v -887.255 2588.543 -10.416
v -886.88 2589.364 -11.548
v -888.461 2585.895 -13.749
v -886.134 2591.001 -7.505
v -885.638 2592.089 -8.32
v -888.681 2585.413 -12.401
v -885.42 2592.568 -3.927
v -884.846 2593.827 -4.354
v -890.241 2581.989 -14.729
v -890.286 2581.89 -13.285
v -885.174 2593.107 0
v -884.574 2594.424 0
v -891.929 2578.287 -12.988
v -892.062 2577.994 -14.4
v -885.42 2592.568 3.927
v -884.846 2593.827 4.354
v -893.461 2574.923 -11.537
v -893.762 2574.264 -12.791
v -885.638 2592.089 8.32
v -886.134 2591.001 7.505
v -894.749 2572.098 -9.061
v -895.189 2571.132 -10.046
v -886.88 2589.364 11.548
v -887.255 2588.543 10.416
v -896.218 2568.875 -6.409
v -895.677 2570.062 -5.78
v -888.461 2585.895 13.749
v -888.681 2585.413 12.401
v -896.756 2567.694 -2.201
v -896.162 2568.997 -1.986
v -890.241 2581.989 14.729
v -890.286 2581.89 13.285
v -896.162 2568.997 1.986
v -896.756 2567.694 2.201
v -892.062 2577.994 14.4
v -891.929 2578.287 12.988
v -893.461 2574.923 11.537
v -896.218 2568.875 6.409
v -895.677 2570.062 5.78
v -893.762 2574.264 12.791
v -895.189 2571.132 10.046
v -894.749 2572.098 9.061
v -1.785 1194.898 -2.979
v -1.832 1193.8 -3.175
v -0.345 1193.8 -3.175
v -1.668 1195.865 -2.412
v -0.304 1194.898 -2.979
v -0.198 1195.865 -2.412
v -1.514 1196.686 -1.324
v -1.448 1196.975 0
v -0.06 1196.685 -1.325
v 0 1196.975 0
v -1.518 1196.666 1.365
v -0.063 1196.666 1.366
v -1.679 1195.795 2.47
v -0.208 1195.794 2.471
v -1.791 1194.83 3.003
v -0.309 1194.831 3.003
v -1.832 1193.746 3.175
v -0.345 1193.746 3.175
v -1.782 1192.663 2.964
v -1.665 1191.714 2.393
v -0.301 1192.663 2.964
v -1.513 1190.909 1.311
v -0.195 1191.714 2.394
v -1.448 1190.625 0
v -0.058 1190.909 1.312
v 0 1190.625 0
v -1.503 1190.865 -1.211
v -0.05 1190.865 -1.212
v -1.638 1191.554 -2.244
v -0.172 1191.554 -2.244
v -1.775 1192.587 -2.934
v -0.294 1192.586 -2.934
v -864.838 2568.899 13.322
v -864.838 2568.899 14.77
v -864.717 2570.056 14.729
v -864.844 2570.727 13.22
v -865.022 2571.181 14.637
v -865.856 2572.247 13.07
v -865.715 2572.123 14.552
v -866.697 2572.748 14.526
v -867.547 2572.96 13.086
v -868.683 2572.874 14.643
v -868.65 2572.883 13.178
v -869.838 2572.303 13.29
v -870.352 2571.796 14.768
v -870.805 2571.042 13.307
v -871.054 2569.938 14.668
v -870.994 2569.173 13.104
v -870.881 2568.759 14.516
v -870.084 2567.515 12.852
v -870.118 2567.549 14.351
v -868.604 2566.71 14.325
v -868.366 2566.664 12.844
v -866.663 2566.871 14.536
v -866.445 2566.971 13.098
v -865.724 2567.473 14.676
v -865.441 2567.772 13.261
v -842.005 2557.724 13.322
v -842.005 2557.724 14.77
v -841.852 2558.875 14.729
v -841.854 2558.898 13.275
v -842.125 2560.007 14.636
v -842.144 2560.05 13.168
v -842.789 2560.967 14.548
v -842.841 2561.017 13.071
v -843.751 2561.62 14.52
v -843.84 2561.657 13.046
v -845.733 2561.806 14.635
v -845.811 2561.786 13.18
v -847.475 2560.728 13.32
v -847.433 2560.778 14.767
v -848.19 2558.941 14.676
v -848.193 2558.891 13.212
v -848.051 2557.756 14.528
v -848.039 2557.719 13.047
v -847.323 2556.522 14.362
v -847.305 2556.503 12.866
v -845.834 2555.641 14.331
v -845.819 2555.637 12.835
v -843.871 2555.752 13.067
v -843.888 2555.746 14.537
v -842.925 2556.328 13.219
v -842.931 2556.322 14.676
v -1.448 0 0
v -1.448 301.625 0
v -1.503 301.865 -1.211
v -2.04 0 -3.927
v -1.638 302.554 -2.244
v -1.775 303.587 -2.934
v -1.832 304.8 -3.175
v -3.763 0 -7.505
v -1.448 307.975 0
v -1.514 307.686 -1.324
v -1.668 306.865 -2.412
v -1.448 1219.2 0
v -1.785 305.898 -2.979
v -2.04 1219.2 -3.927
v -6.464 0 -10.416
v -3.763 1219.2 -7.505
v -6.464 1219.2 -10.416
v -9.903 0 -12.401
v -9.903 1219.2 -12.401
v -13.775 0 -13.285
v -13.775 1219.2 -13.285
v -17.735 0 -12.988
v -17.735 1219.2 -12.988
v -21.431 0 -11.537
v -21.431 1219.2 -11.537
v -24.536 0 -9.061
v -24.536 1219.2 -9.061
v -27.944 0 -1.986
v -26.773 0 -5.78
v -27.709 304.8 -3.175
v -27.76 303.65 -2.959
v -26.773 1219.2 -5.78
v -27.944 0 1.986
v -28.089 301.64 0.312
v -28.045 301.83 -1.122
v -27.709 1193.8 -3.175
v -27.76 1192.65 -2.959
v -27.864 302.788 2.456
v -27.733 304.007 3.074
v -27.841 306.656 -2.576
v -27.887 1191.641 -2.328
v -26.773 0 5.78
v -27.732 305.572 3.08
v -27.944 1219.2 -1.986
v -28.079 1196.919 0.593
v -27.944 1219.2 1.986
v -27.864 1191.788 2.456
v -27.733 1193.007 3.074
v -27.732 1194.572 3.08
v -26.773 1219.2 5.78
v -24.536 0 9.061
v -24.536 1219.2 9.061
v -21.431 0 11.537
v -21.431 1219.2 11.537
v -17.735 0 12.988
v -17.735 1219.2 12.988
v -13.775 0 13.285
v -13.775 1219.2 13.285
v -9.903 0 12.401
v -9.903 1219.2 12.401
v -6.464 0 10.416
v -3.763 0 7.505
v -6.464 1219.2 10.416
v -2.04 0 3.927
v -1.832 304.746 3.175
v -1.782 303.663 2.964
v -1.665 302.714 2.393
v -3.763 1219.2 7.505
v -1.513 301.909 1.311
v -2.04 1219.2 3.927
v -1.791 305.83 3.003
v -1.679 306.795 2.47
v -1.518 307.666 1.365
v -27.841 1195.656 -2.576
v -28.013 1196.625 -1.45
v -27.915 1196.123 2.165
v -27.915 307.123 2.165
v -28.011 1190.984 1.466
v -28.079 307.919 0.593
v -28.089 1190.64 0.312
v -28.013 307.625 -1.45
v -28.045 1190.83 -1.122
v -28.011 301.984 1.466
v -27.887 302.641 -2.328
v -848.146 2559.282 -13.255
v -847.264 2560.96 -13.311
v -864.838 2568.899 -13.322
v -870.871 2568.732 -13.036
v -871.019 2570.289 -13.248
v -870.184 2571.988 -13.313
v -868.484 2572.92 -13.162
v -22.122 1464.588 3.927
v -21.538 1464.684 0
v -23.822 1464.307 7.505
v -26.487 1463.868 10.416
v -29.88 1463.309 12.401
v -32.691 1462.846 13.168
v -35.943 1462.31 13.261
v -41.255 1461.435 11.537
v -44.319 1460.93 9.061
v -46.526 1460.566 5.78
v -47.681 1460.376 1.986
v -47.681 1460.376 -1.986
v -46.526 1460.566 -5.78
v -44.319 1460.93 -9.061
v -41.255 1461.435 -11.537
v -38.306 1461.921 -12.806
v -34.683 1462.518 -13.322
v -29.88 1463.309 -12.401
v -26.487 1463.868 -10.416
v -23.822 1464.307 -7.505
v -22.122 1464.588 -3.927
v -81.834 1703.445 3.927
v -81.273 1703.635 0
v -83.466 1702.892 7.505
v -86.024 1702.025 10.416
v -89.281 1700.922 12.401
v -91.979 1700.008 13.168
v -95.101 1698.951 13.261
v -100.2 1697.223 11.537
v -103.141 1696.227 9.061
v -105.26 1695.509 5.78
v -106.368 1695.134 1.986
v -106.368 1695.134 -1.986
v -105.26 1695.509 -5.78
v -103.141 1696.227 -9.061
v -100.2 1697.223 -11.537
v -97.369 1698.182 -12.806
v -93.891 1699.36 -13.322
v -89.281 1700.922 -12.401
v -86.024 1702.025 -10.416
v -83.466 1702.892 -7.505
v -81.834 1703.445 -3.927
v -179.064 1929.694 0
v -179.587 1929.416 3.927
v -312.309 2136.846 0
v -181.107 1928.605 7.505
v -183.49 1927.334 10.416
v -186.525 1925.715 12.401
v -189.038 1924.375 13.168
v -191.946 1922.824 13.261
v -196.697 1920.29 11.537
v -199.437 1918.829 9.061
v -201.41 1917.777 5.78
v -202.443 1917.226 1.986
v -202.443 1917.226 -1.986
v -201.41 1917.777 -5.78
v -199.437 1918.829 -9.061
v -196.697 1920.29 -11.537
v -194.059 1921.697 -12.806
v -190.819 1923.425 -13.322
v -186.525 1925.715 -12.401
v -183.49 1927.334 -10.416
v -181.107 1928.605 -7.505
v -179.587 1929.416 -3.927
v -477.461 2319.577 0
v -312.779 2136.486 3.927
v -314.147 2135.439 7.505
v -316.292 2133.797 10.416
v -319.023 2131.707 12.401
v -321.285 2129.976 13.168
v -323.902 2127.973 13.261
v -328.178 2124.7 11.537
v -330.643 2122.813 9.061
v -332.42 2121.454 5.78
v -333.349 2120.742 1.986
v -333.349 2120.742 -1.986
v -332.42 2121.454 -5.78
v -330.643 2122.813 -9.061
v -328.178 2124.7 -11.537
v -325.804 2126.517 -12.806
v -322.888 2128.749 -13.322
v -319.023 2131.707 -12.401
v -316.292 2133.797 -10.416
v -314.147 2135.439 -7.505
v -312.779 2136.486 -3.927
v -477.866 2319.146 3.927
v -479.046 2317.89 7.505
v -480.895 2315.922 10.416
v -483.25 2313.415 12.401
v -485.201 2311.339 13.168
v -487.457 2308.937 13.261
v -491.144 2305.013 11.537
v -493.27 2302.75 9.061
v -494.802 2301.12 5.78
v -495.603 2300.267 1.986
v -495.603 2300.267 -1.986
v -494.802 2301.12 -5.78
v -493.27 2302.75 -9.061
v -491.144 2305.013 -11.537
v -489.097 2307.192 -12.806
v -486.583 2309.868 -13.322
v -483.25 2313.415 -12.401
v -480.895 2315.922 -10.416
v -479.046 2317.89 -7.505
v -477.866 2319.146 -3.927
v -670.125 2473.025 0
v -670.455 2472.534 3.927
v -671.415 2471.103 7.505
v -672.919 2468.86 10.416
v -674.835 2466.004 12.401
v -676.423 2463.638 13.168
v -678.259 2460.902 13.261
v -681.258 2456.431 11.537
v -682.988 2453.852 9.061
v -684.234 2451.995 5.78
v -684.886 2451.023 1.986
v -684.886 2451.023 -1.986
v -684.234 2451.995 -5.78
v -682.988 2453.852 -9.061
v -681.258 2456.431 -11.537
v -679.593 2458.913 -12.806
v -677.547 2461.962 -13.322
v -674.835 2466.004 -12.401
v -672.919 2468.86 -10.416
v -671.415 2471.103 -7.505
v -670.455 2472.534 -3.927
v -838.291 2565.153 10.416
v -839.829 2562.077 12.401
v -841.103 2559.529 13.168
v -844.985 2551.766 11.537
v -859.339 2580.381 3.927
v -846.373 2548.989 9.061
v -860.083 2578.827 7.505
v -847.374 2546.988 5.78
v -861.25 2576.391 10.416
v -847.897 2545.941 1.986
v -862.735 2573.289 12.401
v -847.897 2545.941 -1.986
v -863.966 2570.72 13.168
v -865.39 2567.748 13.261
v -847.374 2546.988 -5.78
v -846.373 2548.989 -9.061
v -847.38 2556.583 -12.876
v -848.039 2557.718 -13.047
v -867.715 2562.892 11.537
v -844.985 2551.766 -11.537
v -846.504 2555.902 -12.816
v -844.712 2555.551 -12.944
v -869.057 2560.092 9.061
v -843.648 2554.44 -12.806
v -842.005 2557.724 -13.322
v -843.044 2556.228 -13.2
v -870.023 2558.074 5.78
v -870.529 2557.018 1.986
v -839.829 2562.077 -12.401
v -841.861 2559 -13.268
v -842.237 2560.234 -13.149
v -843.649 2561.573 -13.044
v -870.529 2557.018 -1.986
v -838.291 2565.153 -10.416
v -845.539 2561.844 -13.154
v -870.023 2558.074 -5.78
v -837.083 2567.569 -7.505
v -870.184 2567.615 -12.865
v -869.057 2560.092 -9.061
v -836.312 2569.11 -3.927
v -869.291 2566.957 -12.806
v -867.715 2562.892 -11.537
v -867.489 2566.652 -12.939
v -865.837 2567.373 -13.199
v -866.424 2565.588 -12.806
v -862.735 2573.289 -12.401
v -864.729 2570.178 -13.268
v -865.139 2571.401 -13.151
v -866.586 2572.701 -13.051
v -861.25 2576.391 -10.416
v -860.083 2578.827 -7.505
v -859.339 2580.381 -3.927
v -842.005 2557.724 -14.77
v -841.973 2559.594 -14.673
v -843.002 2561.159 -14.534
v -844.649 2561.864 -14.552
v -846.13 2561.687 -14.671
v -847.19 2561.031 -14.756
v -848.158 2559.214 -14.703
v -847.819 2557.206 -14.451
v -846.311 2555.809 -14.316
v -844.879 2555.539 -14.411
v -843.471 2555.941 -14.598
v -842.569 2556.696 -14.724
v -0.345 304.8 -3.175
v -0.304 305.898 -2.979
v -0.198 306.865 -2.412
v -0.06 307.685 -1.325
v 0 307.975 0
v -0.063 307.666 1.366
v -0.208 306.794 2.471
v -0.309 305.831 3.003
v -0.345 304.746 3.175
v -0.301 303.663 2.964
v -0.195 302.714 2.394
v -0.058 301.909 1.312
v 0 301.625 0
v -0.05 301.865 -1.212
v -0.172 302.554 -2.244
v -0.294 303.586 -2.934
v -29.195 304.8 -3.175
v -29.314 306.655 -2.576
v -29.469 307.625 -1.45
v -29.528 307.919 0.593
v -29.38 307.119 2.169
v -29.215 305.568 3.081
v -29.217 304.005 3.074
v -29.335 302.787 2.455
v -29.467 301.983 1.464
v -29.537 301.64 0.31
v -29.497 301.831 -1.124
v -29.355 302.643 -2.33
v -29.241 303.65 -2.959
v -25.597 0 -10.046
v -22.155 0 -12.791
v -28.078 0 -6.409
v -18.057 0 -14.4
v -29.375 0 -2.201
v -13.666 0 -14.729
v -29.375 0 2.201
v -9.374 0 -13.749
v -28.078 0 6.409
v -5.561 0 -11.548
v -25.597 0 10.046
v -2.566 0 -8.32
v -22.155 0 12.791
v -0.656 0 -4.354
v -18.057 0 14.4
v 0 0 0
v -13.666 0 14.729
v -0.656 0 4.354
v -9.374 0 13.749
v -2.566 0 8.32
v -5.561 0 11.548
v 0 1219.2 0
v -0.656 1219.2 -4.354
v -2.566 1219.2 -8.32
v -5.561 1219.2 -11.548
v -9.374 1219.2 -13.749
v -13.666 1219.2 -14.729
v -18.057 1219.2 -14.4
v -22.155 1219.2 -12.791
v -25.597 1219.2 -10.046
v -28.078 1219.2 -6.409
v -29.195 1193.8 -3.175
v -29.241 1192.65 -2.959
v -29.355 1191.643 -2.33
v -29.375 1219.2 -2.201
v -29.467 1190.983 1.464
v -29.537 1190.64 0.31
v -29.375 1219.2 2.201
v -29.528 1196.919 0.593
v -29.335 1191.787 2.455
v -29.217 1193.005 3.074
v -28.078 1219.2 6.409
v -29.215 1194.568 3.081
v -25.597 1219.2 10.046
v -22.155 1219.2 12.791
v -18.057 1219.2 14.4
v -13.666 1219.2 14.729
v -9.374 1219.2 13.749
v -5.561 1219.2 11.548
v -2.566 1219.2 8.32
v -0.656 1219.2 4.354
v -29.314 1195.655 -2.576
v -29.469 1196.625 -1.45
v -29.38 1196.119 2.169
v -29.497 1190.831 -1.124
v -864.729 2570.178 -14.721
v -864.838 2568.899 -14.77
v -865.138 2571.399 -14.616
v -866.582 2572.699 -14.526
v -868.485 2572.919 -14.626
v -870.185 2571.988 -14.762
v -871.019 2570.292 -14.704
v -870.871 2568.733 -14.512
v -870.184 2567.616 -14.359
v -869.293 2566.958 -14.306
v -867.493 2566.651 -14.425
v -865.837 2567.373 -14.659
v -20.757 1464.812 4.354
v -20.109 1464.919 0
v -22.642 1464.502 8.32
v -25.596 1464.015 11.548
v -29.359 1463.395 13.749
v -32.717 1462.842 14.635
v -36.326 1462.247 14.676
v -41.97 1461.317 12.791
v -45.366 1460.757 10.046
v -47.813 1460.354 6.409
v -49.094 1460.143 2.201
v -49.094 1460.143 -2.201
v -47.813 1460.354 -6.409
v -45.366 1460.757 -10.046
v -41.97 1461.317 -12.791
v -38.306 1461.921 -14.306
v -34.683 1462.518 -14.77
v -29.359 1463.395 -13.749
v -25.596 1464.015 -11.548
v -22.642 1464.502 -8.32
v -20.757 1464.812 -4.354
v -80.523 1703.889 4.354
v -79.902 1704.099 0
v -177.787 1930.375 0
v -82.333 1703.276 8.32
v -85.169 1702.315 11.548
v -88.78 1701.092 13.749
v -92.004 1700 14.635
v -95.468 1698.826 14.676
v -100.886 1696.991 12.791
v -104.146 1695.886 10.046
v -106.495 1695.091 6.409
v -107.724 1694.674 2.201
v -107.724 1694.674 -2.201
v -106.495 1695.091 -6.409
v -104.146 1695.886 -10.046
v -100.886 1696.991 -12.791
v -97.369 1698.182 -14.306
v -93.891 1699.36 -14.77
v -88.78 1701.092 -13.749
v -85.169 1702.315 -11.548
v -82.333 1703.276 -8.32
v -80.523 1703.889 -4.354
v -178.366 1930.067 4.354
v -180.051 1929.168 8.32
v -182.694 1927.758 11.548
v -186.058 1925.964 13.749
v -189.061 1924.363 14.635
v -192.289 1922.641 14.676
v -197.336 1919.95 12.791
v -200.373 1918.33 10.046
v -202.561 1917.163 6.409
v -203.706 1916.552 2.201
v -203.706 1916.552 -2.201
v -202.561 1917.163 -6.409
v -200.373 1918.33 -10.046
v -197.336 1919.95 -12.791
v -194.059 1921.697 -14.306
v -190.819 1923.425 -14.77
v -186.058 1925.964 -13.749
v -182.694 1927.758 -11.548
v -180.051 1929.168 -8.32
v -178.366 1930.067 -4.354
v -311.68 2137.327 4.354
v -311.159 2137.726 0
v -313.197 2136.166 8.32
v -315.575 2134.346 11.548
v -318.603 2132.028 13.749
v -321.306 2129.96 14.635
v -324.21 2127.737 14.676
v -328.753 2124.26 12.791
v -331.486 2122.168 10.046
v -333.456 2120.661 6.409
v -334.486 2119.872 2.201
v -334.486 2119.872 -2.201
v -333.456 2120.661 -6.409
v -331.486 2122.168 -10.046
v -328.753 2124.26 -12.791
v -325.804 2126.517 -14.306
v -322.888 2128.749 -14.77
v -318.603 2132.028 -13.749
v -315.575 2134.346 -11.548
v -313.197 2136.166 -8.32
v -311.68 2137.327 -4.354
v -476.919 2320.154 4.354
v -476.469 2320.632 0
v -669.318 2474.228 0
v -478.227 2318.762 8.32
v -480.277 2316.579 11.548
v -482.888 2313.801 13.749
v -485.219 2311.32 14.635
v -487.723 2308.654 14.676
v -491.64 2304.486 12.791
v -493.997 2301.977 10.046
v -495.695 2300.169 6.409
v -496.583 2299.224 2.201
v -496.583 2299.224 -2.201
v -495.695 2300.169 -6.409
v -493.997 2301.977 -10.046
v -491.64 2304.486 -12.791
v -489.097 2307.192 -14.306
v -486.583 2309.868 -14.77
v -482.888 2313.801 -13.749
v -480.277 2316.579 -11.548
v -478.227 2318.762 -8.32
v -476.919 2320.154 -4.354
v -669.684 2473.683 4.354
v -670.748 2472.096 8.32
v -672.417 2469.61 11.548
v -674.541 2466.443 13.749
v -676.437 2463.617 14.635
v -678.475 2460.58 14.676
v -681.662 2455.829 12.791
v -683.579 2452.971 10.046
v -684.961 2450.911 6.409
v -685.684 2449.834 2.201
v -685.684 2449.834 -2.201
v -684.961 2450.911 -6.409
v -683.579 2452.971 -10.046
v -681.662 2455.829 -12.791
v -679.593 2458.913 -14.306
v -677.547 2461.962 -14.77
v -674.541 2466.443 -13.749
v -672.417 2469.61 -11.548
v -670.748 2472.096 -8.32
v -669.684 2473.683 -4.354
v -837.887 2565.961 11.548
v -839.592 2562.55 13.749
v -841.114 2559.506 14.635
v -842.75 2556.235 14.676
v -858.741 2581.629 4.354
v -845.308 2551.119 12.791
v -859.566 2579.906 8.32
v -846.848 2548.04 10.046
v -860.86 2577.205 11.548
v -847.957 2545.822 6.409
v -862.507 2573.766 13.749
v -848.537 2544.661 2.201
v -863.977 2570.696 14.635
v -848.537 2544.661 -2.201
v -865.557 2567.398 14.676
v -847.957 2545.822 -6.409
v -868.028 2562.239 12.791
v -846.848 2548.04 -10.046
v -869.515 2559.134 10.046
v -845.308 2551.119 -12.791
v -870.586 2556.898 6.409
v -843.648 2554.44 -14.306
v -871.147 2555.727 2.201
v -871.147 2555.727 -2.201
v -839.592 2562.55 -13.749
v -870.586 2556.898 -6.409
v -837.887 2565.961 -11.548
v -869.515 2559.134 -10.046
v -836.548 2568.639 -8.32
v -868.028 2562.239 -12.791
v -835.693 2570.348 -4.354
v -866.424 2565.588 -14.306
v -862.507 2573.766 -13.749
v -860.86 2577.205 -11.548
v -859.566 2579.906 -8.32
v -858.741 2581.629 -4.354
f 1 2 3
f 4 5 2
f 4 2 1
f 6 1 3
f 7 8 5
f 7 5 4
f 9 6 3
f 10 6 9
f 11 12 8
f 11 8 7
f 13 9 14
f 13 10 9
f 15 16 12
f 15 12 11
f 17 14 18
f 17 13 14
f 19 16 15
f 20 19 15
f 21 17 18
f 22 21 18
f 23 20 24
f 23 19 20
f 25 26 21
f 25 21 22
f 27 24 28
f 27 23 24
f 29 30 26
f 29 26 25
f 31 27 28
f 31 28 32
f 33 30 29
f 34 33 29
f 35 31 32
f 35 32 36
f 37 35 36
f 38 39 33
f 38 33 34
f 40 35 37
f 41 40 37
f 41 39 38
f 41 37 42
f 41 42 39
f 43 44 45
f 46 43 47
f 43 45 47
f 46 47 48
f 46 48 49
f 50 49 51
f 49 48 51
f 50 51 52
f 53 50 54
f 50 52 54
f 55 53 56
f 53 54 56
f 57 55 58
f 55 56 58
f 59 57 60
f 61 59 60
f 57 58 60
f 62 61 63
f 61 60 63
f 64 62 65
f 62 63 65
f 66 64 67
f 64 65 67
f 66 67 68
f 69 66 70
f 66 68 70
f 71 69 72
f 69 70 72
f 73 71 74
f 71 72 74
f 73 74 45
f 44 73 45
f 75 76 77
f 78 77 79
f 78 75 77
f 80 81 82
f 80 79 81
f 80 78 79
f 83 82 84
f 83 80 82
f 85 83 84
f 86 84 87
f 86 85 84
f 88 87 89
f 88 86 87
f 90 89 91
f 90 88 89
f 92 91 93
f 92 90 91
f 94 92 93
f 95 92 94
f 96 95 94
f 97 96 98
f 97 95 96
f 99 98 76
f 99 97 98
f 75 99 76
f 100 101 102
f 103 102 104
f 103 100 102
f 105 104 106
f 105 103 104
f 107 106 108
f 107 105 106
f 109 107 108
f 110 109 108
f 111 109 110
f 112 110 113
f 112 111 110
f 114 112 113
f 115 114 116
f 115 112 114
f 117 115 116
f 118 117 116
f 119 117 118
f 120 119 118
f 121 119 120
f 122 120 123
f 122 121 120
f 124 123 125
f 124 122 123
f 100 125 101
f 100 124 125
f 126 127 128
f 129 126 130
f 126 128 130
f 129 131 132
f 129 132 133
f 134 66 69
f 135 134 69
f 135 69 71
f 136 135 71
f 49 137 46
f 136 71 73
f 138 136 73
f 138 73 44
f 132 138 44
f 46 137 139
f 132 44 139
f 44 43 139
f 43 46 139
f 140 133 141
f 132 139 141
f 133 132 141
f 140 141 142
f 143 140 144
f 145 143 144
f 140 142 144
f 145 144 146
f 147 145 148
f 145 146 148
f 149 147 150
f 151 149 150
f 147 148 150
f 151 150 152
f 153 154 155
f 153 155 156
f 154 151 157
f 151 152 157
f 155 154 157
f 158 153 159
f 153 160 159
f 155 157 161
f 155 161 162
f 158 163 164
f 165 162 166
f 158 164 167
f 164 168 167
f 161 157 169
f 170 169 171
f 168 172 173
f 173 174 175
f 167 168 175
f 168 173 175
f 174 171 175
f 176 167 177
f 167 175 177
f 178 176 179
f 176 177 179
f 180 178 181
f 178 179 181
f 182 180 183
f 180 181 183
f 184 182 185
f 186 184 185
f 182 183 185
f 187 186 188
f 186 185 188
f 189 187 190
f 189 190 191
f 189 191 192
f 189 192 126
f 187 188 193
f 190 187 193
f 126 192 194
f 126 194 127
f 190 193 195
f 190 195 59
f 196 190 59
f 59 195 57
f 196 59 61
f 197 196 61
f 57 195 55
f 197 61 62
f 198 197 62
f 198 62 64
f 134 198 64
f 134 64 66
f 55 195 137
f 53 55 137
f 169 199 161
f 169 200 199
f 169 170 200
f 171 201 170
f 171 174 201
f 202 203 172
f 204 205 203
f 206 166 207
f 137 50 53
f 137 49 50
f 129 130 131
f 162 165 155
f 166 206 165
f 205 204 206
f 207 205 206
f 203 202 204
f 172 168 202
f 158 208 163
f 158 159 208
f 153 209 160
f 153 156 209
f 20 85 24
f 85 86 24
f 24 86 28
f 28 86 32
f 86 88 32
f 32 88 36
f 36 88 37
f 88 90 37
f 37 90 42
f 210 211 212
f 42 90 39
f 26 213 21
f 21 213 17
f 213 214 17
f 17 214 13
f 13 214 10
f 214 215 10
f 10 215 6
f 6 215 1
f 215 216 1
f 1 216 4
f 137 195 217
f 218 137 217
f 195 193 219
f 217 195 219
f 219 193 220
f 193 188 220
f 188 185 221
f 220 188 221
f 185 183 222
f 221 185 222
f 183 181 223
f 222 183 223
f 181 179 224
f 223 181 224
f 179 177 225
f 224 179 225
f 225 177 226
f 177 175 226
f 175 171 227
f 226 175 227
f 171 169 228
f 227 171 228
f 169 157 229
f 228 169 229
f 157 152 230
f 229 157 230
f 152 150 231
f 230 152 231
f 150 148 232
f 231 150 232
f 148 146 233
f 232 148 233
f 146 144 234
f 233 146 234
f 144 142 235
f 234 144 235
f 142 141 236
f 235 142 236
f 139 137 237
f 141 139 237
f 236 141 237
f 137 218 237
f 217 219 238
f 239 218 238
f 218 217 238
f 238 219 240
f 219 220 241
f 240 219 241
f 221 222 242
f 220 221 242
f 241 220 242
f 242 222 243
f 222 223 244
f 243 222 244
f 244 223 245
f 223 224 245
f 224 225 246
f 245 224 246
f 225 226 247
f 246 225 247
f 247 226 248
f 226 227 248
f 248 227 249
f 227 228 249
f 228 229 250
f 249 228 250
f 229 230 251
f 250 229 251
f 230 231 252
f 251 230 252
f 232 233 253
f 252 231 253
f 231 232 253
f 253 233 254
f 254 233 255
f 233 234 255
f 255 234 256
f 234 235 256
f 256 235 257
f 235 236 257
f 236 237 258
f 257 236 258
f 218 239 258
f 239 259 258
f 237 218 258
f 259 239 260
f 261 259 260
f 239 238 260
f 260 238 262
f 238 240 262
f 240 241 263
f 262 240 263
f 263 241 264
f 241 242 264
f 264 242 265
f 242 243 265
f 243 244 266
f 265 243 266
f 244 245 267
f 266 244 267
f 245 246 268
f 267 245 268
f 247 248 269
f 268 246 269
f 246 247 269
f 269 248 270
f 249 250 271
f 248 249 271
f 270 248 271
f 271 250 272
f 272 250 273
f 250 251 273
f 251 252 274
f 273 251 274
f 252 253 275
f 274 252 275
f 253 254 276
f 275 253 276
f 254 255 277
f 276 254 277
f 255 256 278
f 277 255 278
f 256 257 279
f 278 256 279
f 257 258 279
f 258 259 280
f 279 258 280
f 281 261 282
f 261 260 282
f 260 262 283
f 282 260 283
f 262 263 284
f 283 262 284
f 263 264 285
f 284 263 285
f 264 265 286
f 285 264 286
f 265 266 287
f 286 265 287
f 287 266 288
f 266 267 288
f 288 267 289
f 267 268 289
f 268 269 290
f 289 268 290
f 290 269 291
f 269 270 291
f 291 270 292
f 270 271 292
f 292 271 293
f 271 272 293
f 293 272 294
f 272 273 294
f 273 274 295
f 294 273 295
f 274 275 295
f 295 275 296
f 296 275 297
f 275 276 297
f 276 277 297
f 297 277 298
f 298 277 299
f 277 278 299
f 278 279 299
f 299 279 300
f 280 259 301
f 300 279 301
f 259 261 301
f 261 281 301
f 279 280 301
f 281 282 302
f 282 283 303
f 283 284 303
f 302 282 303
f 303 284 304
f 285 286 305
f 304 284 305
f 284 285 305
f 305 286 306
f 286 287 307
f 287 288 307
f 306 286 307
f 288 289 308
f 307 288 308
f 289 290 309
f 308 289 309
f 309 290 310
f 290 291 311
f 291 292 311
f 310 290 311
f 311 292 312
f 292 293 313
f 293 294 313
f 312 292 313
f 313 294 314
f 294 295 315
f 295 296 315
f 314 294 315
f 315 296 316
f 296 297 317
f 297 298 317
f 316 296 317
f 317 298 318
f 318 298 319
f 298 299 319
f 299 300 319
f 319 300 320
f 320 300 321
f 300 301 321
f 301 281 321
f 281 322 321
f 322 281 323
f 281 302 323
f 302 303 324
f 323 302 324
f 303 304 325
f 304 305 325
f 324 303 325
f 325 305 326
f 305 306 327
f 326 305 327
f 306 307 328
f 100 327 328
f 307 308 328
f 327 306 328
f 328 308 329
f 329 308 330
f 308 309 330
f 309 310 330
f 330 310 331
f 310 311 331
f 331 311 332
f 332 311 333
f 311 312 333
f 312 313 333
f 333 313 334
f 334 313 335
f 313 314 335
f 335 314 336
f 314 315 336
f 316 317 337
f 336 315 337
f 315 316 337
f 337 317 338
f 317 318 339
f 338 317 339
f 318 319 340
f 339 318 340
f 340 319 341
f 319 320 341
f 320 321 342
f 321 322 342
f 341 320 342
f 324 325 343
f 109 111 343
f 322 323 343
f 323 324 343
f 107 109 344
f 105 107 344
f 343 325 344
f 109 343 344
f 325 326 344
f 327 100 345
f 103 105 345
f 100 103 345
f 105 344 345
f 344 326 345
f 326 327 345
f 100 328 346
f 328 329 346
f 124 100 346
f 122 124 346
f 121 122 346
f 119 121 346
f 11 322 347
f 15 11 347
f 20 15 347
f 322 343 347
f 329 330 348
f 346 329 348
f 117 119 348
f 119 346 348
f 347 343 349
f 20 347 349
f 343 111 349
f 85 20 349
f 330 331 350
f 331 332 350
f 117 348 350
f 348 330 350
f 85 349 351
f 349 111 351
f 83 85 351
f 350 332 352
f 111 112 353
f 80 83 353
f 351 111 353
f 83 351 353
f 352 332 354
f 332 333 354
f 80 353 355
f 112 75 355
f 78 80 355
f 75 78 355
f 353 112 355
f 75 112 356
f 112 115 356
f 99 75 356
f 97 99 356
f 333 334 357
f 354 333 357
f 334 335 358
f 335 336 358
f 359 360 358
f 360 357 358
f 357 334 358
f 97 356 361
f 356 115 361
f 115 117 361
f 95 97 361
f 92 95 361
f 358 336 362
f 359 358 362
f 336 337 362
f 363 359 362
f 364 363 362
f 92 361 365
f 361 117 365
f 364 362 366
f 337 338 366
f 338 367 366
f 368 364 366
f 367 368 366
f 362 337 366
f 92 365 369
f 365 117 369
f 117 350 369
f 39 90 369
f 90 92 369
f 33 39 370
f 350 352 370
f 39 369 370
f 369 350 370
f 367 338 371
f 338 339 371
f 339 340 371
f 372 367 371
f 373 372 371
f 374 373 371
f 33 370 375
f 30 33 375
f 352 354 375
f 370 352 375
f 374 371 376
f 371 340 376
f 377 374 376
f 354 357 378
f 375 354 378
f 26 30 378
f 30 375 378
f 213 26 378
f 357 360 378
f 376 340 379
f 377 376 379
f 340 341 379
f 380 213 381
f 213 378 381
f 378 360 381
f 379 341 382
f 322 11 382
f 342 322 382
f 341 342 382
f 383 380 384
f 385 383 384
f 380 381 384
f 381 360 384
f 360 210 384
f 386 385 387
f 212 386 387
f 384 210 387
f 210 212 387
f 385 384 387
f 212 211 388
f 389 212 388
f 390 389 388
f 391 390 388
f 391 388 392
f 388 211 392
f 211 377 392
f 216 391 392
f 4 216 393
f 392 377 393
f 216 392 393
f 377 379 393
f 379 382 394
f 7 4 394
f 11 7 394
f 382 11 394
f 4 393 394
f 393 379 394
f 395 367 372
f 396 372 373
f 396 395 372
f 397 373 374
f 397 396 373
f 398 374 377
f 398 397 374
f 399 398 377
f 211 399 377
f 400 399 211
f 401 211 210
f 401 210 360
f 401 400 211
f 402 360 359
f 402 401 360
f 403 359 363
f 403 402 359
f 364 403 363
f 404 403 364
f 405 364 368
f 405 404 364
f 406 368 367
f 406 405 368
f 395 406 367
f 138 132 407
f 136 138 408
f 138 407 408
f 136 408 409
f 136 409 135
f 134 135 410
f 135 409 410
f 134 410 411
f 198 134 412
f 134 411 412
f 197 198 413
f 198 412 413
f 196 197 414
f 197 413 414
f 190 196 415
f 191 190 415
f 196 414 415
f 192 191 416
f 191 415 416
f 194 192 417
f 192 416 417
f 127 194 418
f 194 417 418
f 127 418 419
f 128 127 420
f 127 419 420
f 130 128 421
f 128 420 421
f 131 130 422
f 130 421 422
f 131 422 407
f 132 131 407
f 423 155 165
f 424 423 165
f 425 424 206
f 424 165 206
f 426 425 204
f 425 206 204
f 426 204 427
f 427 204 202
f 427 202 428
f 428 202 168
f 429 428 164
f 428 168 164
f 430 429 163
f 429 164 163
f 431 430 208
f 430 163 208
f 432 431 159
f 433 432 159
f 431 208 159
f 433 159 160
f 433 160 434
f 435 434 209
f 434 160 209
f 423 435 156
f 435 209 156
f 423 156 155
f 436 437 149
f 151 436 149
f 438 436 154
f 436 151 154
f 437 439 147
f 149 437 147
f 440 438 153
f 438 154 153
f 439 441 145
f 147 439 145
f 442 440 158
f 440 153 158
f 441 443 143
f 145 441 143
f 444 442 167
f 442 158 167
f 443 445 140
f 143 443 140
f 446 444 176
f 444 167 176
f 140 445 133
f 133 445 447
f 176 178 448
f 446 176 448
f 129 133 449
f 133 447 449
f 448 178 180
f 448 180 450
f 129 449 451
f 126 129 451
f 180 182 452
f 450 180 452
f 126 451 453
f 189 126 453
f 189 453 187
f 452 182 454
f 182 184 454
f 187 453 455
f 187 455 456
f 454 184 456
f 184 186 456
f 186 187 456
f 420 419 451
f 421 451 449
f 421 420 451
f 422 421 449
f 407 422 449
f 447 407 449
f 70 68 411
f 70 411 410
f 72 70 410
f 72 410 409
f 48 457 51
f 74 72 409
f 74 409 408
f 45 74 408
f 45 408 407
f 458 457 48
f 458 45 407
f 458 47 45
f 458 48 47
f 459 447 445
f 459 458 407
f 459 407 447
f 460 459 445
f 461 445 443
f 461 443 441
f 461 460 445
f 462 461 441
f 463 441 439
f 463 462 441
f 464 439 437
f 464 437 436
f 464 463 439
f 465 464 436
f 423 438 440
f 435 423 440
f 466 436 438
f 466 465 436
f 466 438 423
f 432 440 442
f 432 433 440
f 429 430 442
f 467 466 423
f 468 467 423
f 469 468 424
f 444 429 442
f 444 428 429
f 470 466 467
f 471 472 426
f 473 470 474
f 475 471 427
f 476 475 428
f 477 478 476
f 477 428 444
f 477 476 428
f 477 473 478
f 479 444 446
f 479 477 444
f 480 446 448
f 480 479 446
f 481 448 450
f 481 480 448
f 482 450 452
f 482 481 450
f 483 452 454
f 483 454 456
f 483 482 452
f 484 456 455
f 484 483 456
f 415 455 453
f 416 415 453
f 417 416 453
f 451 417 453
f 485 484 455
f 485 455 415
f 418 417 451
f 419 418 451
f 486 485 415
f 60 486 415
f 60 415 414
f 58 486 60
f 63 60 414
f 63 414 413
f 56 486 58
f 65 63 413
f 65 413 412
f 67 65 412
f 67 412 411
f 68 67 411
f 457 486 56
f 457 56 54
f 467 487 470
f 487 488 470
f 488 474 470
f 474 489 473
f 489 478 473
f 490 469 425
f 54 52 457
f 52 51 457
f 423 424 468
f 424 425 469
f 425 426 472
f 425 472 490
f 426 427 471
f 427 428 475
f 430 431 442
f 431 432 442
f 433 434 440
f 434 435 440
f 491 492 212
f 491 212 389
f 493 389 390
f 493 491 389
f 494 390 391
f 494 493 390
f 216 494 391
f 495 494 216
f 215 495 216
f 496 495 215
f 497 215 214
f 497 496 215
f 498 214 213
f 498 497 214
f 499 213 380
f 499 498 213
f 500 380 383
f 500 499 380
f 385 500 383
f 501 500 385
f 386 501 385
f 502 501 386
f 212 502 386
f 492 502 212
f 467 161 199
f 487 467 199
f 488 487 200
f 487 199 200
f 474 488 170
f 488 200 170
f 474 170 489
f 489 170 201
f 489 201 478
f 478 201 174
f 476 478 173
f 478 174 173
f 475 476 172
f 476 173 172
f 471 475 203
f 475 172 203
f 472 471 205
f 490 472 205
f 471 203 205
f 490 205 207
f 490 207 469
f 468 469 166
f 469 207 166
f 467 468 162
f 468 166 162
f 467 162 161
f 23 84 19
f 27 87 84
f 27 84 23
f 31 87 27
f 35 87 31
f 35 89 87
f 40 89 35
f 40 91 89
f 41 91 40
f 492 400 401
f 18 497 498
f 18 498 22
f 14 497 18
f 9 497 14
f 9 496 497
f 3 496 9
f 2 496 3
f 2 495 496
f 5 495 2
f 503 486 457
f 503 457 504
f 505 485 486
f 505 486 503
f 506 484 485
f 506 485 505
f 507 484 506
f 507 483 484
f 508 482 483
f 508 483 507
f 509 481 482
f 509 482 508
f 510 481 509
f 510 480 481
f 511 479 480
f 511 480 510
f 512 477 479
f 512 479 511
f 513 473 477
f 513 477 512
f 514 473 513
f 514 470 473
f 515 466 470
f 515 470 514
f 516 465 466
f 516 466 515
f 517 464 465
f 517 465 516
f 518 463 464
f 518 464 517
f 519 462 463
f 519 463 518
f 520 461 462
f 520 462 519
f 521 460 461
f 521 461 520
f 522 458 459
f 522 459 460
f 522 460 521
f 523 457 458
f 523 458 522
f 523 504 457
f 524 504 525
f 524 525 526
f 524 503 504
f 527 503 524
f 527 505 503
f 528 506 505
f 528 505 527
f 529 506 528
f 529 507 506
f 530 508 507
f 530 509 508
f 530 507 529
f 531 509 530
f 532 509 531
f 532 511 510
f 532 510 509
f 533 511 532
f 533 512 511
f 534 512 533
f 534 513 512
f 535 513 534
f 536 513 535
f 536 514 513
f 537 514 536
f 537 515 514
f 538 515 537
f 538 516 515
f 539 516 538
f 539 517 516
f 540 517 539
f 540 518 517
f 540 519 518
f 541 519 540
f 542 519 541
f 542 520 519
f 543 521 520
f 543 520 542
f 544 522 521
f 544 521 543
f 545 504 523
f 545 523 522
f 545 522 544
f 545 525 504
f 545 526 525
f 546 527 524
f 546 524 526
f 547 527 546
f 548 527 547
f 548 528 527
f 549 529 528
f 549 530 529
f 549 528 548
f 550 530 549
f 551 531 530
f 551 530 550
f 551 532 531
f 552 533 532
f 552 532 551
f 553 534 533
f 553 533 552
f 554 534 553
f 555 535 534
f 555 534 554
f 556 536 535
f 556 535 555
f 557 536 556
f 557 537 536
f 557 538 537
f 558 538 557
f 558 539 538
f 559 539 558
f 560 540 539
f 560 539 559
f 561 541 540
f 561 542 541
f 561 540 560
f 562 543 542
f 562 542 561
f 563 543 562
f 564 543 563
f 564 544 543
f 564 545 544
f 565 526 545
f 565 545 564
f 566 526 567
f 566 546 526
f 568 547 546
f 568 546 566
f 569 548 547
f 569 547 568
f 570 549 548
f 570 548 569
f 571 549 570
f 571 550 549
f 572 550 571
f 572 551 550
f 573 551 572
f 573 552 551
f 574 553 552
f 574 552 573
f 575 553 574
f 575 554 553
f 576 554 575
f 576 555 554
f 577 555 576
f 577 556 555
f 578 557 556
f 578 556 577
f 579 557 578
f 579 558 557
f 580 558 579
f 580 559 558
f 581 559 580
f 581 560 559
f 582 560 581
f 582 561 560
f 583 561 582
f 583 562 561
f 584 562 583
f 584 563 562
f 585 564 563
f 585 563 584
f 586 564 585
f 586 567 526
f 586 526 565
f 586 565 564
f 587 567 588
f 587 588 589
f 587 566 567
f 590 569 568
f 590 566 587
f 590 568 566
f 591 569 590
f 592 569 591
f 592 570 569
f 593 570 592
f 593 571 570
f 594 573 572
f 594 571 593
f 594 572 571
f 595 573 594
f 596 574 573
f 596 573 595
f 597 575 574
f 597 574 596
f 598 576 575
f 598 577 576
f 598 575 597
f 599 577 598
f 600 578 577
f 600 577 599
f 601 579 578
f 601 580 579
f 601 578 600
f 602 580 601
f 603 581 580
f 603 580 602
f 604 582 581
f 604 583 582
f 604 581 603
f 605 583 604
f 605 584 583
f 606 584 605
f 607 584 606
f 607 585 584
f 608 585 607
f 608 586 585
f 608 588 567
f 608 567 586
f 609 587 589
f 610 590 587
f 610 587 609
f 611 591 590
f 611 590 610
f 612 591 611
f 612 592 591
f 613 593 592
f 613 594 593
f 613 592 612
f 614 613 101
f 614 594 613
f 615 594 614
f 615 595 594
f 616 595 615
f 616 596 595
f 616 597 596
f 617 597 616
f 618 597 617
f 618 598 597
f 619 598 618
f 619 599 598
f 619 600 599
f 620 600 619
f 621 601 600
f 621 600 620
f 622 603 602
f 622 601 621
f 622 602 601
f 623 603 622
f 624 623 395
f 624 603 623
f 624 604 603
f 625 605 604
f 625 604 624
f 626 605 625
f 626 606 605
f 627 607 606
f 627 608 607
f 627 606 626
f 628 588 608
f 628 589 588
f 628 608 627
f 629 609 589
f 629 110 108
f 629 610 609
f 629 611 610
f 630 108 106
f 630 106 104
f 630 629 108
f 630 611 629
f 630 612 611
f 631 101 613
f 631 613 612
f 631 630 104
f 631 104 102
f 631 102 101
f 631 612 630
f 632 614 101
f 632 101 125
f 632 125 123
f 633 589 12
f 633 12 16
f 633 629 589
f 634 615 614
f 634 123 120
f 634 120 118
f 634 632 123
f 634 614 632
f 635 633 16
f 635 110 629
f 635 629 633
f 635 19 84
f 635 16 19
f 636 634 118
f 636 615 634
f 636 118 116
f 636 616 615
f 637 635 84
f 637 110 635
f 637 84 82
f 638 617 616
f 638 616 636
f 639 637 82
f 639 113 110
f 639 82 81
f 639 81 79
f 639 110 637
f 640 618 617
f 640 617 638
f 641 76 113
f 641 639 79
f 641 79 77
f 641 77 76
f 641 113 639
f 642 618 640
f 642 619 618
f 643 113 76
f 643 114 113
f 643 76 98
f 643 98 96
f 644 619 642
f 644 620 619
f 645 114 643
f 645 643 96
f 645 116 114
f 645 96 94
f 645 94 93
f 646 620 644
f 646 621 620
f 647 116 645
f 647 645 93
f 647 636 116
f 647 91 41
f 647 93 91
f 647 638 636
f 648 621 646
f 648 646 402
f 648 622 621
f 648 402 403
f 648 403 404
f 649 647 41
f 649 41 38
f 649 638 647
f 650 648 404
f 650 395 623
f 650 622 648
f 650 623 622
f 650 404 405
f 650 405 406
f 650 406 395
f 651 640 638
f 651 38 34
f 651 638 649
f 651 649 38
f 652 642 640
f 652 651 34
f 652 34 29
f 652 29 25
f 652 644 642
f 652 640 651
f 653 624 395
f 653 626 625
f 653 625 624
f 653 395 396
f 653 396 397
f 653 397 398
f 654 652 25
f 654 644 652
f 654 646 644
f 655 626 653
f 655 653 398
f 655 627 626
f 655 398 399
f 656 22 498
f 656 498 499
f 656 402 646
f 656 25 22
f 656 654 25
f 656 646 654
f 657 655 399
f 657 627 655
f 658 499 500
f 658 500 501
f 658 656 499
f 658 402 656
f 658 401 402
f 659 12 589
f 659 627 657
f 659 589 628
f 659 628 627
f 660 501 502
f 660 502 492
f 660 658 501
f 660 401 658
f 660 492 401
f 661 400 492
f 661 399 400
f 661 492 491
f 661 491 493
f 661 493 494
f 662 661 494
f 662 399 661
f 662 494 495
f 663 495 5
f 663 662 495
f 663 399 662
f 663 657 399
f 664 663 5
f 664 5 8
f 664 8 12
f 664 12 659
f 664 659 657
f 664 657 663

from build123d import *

# Parameters (mm, degrees)
SKETCH2_R               = 14.7701
SKETCH2_R_2             = 13.3223
SKETCH7_R               = 3.175
CUT_EXTRUDE1_DEPTH      = 31.75
CUT_EXTRUDE2_DEPTH      = 2746.095657429
CUT_EXTRUDE2_DEPTH_BACK = 2746.095657429
SKETCH8_R               = 3.175


with BuildPart() as part:
    # Sweep1: sweep along a path in Sketch1
    with BuildLine(Plane.XY) as sweep1_path:
        Line((0, 0), (0, 1219.2))
        ThreePointArc((0, 1219.2), (-240.237739707, 2036.774718578), (-884.574102374, 2594.424468676))
    # Sketch2 → Sweep1 (sweep)
    with BuildSketch(Plane(origin=(0, 0, 0), x_dir=(1, 0, 0), z_dir=(0, 1, 0))):
        with Locations((-14.7701, 0)):
            Circle(SKETCH2_R)
        with Locations((-14.7701, 0)):
            Circle(SKETCH2_R_2, mode=Mode.SUBTRACT)
    sweep(path=sweep1_path.line)

    # Sketch7 → Cut-Extrude1 (cut)
    with BuildSketch(Plane(origin=(0, 0, 0), x_dir=(0, 0, -1), z_dir=(1, 0, 0))):
        with Locations((0, 304.8)):
            Circle(SKETCH7_R)
        with Locations((0, 1193.8)):
            Circle(SKETCH7_R)
    extrude(amount=-CUT_EXTRUDE1_DEPTH, mode=Mode.SUBTRACT)

    # Sketch8 → Cut-Extrude2 (cut, two sides: drawn at the far end of the back side and taken through both)
    with BuildSketch(Plane.XY.offset(-CUT_EXTRUDE2_DEPTH_BACK)):
        with Locations(Location((-867.881837823, 2569.802206518, 0), (0, 0, 343.480242045))):
            Circle(SKETCH8_R)
        with Locations(Location((-845.023200114, 2558.710815323, 0), (0, 0, 341.89235985))):
            Circle(SKETCH8_R)
    extrude(amount=CUT_EXTRUDE2_DEPTH + CUT_EXTRUDE2_DEPTH_BACK, mode=Mode.SUBTRACT)


solid = part.part
